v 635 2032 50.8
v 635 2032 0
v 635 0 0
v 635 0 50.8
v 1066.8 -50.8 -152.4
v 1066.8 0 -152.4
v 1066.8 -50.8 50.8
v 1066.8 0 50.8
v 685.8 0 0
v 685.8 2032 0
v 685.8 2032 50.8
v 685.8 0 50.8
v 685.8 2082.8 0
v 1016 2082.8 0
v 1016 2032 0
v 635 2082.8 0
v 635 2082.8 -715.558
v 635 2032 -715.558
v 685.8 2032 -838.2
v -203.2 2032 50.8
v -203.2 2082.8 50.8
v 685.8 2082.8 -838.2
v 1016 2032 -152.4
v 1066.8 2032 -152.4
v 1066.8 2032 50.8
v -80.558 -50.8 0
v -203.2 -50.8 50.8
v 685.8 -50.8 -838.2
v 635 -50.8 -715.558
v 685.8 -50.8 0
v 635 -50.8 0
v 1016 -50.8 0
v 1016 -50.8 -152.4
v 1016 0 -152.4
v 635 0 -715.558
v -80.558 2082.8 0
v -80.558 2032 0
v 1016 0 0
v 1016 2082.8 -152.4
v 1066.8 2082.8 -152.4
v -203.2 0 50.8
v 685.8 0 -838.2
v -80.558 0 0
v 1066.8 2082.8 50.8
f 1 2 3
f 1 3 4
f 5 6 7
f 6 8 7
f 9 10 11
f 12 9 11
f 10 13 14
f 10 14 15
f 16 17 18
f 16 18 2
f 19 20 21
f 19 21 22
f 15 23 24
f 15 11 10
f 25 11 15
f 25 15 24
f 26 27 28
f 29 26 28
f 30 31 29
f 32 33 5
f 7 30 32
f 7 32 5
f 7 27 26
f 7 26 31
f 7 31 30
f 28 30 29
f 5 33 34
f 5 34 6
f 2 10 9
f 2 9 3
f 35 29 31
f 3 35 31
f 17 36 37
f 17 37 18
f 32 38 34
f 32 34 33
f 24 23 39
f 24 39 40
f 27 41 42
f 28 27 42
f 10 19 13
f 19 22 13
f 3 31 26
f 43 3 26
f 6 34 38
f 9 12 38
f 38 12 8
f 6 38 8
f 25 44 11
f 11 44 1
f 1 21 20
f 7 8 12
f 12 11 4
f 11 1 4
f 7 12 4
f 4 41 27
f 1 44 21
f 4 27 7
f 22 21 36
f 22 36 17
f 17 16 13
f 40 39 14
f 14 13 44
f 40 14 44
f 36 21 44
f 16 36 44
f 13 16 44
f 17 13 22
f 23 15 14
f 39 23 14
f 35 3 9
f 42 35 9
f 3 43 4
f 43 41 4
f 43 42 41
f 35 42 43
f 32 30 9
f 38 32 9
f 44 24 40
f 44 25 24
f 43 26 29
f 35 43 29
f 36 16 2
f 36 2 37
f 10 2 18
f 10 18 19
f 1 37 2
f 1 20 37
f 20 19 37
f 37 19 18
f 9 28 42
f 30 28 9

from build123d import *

# Parameters (mm, degrees)
F1_DEPTH  = 50.8
F2_W      = 50.8
F2_H      = 50.8
F3_DEPTH  = 1016
F5_W      = 50.8
F5_H      = 50.8
F6_DEPTH  = 381
F9_DEPTH  = 1066.801
F11_W     = 50.8
F11_H     = 50.8
F12_DEPTH = 152.4


with BuildPart() as f1:
    # F0 (on Front) → F1 (new body)
    with BuildSketch(Plane.XZ):
        Polygon((685.8, 50.8), (-203.2, 50.8), (685.8, -838.2), align=None)
    extrude(amount=F1_DEPTH)

    # F2 (on face) → F3 (join)
    with BuildSketch(Plane(origin=(0, 0, 0), x_dir=(-1, 0, 0), z_dir=(0, 1, 0))):
        with Locations((-660.4, 25.4)):
            Rectangle(F2_W, F2_H)
    extrude(amount=F3_DEPTH)

    # F5 (on face) → F6 (join)
    with BuildSketch(Plane.YZ.offset(685.8)):
        with Locations((-25.4, 25.4)):
            Rectangle(F5_W, F5_H)
    extrude(amount=F6_DEPTH)

    # F8 (on face) → F9 (cut, through all)
    with BuildSketch(Plane.XZ.offset(50.8)):
        Polygon((635, -715.5579510314), (635, 0), (-80.5579510314, 0), align=None)
    extrude(amount=-F9_DEPTH, mode=Mode.SUBTRACT)

    # F11 (on face) → F12 (join)
    with BuildSketch(Plane(origin=(0, 0, 0), x_dir=(1, 0, 0), z_dir=(0, 0, -1))):
        with Locations((1041.4, 25.4)):
            Rectangle(F11_W, F11_H)
    extrude(amount=F12_DEPTH)

    # F13: F1 across plane


with BuildPart() as f1_1:
    add(f1.part)
    add(f1.part.mirror(Plane(origin=(660.4, 1016, 25.4), x_dir=(-1, 0, 0), z_dir=(0, 1, 0))))


solid = f1_1.part
